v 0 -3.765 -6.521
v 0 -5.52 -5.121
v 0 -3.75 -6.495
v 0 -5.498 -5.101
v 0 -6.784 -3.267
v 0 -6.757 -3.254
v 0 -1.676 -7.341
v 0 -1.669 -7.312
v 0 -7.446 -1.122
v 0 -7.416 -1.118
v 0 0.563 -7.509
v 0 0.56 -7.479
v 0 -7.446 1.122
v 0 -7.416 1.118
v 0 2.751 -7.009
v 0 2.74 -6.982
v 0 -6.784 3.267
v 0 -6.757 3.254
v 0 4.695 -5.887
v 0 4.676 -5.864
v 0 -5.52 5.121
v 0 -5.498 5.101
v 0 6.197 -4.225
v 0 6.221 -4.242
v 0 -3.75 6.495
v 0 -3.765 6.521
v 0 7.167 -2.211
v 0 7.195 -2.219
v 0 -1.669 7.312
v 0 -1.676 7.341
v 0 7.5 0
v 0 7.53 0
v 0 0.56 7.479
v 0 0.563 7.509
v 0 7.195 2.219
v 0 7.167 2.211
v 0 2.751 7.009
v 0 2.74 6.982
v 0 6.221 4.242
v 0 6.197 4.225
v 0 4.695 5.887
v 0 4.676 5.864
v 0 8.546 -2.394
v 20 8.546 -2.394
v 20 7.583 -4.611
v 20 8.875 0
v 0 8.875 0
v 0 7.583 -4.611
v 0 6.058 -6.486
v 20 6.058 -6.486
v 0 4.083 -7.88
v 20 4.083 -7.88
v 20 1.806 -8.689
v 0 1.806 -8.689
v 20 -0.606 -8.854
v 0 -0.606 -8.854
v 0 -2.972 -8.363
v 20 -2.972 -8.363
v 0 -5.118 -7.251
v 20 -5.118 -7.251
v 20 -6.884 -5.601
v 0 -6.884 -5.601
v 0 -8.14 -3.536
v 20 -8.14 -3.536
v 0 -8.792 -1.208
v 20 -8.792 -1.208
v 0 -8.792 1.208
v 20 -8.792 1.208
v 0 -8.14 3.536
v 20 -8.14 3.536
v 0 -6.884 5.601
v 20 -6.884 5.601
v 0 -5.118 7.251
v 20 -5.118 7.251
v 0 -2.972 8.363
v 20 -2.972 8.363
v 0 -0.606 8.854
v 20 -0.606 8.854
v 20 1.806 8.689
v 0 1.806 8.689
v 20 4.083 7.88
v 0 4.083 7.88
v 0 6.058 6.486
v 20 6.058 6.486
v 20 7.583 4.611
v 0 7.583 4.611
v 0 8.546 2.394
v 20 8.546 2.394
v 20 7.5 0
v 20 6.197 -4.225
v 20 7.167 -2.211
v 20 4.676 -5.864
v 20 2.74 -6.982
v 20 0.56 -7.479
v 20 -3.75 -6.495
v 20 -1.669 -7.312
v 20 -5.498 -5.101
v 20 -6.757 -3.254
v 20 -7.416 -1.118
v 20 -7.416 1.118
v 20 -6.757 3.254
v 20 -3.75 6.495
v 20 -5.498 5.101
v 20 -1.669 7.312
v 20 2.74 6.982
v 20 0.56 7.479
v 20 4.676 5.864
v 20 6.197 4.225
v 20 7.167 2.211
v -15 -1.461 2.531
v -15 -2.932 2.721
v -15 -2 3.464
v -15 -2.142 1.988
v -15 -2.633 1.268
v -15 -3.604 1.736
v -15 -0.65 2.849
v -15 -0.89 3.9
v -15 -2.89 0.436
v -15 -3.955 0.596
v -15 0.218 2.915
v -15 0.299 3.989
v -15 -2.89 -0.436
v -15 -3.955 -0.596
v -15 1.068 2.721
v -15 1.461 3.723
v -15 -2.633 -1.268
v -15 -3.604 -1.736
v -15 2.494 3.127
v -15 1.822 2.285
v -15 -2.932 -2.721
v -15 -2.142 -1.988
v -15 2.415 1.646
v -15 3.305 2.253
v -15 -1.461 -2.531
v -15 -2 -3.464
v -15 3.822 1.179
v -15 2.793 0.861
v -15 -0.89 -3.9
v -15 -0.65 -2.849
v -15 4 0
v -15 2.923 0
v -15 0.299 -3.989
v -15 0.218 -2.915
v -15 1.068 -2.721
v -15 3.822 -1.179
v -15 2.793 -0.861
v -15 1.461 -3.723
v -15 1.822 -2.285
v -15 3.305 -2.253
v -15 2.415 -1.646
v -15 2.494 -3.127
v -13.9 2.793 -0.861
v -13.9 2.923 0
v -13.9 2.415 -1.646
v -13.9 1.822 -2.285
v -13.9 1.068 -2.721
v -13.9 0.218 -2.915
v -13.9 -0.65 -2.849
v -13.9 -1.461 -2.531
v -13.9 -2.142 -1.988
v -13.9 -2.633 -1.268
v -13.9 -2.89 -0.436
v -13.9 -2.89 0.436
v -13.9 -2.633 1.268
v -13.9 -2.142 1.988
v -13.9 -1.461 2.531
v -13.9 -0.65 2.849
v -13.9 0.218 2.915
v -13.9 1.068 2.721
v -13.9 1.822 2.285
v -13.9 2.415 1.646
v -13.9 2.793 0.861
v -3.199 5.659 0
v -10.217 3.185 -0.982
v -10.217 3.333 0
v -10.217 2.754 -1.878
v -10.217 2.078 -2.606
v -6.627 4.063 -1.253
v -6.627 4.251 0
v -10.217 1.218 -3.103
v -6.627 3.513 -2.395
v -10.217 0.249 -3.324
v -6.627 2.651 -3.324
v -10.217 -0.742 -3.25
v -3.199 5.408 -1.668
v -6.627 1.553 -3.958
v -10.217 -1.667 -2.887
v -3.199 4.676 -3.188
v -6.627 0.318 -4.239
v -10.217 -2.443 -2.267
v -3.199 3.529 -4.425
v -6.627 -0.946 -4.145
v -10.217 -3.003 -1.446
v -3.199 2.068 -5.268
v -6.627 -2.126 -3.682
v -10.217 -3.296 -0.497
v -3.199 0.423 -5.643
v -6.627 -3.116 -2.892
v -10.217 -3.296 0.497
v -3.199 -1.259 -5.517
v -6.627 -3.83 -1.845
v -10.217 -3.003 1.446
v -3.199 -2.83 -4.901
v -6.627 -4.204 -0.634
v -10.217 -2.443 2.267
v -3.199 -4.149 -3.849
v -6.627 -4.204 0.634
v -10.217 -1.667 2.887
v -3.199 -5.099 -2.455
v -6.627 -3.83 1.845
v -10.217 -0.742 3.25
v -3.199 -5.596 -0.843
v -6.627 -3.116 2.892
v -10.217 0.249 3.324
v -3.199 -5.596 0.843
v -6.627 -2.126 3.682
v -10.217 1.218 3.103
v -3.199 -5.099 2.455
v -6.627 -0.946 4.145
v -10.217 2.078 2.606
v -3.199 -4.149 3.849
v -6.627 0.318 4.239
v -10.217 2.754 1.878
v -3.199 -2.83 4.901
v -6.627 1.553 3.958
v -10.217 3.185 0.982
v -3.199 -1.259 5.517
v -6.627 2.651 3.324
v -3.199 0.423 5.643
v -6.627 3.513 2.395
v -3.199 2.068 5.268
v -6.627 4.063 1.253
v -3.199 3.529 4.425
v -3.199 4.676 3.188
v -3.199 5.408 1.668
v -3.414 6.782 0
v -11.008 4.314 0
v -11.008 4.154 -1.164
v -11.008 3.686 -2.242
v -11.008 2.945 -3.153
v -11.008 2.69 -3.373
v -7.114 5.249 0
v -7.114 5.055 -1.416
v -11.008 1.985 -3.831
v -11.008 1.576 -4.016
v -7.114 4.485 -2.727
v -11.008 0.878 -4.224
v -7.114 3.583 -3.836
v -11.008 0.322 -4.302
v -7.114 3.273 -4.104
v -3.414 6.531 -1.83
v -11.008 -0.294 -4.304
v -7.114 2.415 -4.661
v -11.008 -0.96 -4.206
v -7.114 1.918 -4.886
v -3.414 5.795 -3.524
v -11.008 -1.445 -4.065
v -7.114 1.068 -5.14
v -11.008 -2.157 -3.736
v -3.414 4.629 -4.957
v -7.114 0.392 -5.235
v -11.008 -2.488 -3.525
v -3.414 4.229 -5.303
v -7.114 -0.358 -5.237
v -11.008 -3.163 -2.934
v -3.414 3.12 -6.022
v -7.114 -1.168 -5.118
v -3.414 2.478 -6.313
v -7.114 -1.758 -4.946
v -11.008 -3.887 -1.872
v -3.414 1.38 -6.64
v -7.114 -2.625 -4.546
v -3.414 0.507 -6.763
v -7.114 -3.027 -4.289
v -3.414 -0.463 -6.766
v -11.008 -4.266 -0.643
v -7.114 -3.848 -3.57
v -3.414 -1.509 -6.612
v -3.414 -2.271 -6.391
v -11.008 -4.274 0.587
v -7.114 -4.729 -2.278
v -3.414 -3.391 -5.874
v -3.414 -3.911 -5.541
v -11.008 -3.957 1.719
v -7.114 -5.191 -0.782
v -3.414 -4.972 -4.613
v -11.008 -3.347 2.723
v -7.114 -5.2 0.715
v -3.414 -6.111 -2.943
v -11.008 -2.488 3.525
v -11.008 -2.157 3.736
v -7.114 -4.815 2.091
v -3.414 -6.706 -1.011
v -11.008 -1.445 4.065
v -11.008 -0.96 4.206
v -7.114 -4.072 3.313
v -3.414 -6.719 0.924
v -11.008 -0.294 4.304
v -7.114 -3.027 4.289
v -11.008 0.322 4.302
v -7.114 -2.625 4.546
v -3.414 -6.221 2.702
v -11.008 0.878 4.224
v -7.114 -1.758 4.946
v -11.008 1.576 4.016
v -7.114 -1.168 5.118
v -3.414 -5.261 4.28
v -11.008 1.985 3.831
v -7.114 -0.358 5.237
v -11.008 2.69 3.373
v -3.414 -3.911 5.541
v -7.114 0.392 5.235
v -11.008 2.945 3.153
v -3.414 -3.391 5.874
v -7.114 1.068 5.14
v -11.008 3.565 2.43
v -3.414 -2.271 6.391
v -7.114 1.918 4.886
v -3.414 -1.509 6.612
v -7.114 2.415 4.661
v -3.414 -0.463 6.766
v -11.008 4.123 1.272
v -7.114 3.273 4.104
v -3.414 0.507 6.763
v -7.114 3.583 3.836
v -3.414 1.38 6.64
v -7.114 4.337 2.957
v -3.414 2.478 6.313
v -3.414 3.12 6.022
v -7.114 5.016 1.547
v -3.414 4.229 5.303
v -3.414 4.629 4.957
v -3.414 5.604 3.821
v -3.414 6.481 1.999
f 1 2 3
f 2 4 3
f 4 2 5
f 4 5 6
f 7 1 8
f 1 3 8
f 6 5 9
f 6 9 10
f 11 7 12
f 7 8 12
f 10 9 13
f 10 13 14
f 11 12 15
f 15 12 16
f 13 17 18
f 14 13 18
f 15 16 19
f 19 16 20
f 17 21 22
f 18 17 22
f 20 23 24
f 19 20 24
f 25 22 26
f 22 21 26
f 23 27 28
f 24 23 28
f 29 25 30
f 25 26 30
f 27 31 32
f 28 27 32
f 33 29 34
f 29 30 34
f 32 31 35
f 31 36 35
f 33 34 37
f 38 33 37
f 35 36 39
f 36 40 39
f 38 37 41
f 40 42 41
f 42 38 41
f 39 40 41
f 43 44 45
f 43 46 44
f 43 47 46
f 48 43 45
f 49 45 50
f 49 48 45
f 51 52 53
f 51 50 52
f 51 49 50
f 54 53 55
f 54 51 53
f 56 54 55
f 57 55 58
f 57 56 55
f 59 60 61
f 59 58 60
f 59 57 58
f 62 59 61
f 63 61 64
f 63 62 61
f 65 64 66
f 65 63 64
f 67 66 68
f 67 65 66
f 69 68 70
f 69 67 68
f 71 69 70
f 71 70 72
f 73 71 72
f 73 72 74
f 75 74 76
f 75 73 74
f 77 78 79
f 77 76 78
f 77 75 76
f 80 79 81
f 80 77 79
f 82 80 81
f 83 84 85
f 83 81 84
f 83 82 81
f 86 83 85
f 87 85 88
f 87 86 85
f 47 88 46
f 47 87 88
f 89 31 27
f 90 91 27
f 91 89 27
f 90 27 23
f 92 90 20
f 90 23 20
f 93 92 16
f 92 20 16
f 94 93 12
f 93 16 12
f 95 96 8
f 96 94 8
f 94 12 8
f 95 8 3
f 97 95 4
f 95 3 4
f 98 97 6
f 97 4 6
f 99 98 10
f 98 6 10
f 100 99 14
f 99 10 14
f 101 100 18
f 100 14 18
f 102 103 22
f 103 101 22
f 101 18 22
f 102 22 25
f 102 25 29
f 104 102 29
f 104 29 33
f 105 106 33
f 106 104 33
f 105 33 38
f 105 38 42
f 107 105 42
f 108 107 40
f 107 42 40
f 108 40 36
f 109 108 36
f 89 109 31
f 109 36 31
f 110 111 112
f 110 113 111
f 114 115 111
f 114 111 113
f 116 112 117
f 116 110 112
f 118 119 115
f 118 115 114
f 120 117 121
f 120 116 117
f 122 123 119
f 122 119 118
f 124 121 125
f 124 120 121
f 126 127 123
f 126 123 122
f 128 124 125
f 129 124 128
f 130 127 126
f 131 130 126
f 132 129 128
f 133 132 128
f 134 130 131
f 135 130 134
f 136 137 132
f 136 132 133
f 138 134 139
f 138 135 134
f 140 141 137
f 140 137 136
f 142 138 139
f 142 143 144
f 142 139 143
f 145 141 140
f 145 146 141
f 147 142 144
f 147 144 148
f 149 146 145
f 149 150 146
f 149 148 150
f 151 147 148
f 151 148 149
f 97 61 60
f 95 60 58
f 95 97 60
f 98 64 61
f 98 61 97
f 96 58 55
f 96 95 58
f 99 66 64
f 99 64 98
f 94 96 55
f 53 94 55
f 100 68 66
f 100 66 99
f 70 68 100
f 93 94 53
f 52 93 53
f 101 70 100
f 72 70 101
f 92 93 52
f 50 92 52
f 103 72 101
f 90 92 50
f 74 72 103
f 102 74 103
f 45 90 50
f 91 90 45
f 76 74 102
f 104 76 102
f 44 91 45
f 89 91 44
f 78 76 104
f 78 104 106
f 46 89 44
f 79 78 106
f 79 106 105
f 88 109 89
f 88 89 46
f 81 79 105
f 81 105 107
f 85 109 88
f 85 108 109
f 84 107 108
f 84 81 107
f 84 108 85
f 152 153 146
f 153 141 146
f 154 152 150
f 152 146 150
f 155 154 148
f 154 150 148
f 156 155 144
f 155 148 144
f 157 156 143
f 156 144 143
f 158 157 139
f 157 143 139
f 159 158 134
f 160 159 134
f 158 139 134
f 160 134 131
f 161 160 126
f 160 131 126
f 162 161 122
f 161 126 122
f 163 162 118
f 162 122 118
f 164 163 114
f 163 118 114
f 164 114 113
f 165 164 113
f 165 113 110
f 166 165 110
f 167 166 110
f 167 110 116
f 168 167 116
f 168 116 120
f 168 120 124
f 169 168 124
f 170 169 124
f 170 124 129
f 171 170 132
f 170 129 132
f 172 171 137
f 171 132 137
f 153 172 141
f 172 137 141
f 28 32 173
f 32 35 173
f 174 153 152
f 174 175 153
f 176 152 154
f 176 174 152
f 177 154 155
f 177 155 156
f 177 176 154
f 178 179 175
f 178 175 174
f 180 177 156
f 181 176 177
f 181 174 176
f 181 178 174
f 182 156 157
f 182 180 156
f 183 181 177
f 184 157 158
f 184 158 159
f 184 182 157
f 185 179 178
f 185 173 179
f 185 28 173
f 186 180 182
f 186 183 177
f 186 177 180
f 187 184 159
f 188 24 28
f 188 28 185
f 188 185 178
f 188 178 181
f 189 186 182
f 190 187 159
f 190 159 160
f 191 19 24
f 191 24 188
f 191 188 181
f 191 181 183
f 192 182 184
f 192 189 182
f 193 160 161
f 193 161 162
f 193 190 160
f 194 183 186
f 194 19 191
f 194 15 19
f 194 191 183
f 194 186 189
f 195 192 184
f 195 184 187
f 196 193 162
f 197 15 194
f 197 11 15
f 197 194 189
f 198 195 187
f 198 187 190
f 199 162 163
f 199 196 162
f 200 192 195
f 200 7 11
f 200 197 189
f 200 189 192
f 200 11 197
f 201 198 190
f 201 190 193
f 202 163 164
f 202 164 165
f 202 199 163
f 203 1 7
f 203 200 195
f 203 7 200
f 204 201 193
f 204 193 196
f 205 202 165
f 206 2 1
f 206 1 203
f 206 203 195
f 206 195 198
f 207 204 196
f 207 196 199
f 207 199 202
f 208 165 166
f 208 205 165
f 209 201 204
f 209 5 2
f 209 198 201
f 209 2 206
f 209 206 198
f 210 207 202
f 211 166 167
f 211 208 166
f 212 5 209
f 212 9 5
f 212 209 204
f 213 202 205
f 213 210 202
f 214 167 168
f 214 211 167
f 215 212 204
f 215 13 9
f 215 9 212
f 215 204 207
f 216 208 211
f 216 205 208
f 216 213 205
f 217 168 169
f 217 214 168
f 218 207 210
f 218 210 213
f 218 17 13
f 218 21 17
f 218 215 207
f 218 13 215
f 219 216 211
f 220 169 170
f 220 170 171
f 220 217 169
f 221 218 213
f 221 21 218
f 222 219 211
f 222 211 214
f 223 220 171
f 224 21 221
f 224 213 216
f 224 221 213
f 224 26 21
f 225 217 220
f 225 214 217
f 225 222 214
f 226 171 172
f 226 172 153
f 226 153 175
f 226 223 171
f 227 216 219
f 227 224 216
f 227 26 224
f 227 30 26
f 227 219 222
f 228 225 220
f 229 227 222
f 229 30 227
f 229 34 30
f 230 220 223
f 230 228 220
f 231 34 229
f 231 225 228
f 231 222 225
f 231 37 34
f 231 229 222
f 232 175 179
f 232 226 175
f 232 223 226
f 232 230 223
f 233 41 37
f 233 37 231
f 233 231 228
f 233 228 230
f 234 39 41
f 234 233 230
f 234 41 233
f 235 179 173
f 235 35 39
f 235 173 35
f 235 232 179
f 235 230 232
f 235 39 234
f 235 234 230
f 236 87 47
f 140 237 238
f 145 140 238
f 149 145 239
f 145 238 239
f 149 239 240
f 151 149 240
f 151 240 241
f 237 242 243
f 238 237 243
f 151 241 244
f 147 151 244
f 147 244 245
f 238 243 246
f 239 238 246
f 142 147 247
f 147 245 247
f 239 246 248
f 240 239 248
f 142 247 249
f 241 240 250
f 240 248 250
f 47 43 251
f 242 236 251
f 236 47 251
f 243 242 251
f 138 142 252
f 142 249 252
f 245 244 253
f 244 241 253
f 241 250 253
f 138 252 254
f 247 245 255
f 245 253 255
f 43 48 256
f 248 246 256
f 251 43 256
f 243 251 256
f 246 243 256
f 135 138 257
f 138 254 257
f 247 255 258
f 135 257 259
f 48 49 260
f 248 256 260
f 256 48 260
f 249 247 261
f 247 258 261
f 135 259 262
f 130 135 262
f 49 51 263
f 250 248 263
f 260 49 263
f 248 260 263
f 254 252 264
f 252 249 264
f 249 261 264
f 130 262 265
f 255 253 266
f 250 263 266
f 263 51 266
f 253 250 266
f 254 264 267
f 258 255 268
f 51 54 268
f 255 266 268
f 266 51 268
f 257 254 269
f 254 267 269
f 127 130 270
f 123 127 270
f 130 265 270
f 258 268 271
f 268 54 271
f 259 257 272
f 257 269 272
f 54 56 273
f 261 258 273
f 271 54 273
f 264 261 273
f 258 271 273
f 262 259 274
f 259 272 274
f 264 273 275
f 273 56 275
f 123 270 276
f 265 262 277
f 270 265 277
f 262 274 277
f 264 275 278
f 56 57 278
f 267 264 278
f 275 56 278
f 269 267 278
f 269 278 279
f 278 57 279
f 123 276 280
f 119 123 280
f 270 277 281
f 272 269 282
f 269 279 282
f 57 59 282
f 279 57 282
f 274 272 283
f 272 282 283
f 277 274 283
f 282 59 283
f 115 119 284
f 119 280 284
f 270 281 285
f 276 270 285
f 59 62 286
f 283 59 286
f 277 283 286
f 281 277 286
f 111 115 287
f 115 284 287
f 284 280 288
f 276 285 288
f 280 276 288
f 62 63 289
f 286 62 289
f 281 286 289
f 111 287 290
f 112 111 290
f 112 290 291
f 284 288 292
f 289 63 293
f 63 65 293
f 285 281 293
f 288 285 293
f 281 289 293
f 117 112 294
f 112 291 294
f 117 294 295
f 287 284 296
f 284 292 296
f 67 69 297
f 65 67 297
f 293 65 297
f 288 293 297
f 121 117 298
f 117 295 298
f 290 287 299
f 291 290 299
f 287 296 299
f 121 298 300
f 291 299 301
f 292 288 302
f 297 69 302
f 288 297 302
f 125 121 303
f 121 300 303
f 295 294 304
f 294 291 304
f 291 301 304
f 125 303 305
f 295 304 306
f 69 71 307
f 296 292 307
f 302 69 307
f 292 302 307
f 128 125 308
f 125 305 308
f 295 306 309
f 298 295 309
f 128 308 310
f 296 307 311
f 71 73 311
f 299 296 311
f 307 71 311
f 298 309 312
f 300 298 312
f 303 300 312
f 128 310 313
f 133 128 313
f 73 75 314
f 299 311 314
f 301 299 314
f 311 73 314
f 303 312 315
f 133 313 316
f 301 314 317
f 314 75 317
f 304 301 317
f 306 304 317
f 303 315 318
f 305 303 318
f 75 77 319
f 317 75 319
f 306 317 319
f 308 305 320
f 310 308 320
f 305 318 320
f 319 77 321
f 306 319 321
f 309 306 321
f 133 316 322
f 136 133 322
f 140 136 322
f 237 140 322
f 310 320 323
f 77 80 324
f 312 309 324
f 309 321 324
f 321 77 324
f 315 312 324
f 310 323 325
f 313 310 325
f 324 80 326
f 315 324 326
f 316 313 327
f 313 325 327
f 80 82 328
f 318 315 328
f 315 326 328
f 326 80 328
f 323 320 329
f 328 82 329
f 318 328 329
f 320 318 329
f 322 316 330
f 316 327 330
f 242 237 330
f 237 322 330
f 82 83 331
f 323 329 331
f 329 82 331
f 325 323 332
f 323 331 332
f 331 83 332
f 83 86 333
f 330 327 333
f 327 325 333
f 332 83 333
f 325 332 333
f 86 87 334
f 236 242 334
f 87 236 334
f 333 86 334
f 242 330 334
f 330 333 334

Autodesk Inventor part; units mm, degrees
ref_plane "YZ Plane" through (0, 0, 0) normal (1, 0, 0) x (0, 1, 0)
ref_plane "XZ Plane" through (0, 0, 0) normal (0, 1, 0) x (-1, 0, 0)
ref_plane "XY Plane" through (0, 0, 0) normal (0, 0, 1) x (1, 0, 0)
sketch "Sketch1" plane through (0, 0, 0) normal (1, 0, 0) x (0, 1, 0)
  circle A0 centre (0, 0) radius 7.5
  circle A1 centre (0, 0) radius 8.875
  dimension "d0" = 15
  dimension "d1" = 17.75
extrude "Extrusion1" add sketch "Sketch1" along normal blind 20
sketch "Sketch2" plane through (0, 0, 0) normal (0, 0, 1) x (1, 0, 0)
  line L0 (-15, 0) -> (-15, 4) construction
  arc A0 (-15, 4) -> (0, 8.875) centre (-15, 29.5144) ccw
  line L1 (-15, 4) -> (-2.0685, 4) construction
  arc A1 (-13.9, 2.9227) -> (0, 7.5297) centre (-15, 29.5144) ccw
  line L2 (-13.9, 2.9227) -> (-13.9, 0) construction
  line L3 (0, -8.875) -> (0, 8.875) projected
  line L4 (0, 8.875) -> (0, 7.5297)
  line L5 (-13.9, 2.9227) -> (-15, 2.9227)
  line L6 (-15, 2.9227) -> (-15, 4)
  line L7 (0, 0) -> (-13.9, 0) construction
  dimension "d4" = 15
  dimension "d6" = 4
  dimension "d7" = 1.1
revolve "Revolution1" add sketch "Sketch2" angle 360 about axis through (0, 0, 0) along (-1, 0, 0)
properties part number "5 mm nozle"
